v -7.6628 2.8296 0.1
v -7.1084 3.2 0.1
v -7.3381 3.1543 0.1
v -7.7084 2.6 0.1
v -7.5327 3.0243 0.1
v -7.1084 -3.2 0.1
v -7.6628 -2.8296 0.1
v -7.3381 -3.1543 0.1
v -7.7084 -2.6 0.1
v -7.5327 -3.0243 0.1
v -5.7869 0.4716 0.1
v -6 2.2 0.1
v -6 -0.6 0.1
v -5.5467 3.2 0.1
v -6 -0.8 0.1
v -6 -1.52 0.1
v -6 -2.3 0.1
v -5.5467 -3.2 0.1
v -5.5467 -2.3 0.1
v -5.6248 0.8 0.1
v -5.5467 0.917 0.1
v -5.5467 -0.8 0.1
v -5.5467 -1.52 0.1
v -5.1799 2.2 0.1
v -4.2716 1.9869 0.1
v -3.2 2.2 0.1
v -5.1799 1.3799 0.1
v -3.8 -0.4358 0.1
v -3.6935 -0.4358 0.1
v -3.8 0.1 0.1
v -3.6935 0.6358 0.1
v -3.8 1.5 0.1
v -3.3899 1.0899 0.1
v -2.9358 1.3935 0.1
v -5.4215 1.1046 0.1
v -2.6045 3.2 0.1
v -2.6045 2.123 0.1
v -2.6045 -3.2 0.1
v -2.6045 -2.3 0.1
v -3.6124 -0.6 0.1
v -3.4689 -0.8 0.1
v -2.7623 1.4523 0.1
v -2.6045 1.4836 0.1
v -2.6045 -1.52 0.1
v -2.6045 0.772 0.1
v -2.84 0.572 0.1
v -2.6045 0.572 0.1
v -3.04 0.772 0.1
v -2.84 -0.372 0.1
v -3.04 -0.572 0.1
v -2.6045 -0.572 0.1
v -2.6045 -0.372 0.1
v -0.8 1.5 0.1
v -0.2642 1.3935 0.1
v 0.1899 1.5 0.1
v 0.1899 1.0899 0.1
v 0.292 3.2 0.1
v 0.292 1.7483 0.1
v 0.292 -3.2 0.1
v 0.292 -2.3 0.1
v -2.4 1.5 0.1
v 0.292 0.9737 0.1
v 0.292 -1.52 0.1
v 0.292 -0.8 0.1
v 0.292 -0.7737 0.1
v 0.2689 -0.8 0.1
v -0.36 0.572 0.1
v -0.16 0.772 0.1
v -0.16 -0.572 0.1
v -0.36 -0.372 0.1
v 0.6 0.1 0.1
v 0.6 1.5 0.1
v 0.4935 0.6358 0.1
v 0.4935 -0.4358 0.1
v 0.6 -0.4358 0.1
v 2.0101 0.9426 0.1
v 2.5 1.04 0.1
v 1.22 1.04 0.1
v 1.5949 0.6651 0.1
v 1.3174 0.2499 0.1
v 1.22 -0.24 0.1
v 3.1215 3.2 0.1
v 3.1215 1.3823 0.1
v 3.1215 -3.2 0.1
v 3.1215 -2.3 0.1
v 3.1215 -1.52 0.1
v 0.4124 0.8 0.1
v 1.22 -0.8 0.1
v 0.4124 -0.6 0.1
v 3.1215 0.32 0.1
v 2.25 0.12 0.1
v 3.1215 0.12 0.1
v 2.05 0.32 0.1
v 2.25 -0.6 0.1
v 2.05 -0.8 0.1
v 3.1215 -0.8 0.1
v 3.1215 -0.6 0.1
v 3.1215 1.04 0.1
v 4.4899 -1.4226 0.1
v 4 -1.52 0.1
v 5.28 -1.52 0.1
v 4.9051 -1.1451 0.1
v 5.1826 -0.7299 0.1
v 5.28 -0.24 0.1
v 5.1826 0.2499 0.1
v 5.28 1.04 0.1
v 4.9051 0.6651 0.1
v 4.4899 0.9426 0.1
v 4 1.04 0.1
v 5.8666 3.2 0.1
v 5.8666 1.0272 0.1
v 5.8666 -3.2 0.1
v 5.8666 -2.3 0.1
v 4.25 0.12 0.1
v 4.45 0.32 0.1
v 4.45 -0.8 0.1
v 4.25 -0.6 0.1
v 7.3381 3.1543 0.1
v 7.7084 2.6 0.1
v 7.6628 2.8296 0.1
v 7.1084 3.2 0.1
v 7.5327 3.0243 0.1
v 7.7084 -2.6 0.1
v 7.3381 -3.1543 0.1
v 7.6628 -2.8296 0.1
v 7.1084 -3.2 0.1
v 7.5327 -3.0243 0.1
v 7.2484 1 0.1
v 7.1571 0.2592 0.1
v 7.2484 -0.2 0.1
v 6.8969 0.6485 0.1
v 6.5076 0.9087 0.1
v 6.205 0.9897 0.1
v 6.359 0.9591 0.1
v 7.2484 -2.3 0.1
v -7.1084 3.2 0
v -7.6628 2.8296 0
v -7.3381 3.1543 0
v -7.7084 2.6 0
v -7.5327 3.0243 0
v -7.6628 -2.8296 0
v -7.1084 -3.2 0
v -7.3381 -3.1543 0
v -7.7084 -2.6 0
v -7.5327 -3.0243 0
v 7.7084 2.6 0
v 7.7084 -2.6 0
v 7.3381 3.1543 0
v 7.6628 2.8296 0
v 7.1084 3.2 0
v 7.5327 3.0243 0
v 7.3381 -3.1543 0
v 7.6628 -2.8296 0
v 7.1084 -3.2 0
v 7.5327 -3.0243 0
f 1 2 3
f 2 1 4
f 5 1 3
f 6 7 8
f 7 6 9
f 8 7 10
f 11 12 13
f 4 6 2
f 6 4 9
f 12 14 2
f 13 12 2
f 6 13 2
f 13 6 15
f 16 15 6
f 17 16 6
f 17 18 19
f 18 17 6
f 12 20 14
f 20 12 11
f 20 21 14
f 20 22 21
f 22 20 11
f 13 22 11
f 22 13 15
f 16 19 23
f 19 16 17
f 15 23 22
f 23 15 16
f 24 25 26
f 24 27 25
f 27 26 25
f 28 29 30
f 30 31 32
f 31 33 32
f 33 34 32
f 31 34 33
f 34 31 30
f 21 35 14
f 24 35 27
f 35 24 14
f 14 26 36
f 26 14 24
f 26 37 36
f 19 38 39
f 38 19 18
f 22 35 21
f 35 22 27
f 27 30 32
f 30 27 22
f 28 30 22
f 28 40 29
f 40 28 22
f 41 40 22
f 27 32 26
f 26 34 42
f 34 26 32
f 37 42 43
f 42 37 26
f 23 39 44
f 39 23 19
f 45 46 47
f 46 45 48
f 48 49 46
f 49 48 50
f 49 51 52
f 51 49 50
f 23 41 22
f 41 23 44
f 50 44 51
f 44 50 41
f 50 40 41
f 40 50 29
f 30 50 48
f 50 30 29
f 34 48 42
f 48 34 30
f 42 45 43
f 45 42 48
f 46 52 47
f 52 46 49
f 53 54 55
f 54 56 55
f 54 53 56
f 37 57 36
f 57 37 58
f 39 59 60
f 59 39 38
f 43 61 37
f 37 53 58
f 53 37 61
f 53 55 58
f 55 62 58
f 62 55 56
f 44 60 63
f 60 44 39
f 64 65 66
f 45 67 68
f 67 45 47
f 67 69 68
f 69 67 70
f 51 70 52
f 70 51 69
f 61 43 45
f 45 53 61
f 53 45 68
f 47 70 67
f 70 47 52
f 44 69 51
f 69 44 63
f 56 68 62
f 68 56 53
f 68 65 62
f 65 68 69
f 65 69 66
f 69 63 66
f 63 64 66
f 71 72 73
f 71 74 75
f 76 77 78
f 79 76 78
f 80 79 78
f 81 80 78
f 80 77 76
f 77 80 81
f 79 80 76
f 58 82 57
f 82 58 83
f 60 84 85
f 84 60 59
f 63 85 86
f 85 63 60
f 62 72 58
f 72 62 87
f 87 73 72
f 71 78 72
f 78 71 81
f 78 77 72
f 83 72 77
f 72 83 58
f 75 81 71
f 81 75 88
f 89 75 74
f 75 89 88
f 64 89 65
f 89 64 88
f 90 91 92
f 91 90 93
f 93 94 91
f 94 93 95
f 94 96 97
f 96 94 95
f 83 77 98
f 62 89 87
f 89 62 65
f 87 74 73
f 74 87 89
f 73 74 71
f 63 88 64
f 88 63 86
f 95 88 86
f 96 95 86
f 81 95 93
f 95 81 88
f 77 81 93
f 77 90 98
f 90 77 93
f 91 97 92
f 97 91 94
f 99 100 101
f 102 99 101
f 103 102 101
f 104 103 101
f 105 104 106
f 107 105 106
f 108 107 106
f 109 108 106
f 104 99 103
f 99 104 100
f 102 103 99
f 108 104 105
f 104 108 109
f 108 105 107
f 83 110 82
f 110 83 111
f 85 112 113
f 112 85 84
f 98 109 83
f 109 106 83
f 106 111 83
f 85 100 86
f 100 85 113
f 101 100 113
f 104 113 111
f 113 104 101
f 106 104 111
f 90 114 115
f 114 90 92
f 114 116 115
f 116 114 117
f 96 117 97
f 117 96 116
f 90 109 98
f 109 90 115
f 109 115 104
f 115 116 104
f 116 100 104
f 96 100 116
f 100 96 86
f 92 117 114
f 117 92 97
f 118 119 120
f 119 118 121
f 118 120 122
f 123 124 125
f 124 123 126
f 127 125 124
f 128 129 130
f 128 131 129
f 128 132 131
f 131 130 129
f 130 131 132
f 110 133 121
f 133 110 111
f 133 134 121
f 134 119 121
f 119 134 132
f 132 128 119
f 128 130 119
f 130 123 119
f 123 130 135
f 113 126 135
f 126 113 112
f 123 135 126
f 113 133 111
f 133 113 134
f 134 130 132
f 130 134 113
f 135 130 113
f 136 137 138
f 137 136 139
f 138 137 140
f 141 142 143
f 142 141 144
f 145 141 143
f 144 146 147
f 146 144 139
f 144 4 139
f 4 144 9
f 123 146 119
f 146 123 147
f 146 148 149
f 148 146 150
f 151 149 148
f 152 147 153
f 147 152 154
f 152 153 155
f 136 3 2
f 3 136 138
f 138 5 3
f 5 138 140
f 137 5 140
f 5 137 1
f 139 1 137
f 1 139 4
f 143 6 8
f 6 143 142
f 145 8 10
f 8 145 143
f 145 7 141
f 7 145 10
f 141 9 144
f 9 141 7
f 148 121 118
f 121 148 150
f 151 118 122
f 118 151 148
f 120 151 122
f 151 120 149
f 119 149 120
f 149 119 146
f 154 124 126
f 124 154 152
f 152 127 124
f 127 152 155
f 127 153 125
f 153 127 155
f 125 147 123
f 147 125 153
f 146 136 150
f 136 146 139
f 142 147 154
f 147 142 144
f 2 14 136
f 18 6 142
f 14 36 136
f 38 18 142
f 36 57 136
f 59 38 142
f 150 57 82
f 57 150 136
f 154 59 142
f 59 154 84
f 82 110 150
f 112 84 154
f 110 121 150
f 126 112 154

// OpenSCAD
use <../lib.scad>
use <6142271s.scad>
function ldraw_lib__6142271t() = [
// 0 Sticker  0.8 x  1.9 with Red Taillamp on Black Background Right
// 0 Name: 6142271t.dat
// 0 Author: Massimo Maso [Sirio]
// 0 !LDRAW_ORG Part UPDATE 2025-02
// 0 !LICENSE Licensed under CC BY 4.0 : see CAreadme.txt
// 
// 0 BFC CERTIFY CCW
  [0,"BFC","CERTIFY"],
  [0,"BFC","CCW"],
// 
// 0 !KEYWORDS Audi, Bricklink 75873stk01a, Brickowl 427960, LMS, R8
// 0 !KEYWORDS Rebrickable 24755, Set 75873, Speed Champions, Ultra
// 
// 0 !HISTORY 2025-02-27 [OrionP] Official Update 2025-02
// 
// 
// 1 16 0 0 0 -1 0 0 0 1 0 0 0 1 6142271s.dat
  [1,16,0,0,0,-1,0,0,0,1,0,0,0,1, ldraw_lib__6142271s()],
];
module ldraw_lib__6142271t(step=0, col=false, unit=2/5, alt=false, line=0.2, solid=!$preview)
    makepoly(ldraw_lib__6142271t(), step=step, col=col, unit=unit, alt=alt, line=line, solid=solid);
ldraw_lib__6142271t(line=0.2);
